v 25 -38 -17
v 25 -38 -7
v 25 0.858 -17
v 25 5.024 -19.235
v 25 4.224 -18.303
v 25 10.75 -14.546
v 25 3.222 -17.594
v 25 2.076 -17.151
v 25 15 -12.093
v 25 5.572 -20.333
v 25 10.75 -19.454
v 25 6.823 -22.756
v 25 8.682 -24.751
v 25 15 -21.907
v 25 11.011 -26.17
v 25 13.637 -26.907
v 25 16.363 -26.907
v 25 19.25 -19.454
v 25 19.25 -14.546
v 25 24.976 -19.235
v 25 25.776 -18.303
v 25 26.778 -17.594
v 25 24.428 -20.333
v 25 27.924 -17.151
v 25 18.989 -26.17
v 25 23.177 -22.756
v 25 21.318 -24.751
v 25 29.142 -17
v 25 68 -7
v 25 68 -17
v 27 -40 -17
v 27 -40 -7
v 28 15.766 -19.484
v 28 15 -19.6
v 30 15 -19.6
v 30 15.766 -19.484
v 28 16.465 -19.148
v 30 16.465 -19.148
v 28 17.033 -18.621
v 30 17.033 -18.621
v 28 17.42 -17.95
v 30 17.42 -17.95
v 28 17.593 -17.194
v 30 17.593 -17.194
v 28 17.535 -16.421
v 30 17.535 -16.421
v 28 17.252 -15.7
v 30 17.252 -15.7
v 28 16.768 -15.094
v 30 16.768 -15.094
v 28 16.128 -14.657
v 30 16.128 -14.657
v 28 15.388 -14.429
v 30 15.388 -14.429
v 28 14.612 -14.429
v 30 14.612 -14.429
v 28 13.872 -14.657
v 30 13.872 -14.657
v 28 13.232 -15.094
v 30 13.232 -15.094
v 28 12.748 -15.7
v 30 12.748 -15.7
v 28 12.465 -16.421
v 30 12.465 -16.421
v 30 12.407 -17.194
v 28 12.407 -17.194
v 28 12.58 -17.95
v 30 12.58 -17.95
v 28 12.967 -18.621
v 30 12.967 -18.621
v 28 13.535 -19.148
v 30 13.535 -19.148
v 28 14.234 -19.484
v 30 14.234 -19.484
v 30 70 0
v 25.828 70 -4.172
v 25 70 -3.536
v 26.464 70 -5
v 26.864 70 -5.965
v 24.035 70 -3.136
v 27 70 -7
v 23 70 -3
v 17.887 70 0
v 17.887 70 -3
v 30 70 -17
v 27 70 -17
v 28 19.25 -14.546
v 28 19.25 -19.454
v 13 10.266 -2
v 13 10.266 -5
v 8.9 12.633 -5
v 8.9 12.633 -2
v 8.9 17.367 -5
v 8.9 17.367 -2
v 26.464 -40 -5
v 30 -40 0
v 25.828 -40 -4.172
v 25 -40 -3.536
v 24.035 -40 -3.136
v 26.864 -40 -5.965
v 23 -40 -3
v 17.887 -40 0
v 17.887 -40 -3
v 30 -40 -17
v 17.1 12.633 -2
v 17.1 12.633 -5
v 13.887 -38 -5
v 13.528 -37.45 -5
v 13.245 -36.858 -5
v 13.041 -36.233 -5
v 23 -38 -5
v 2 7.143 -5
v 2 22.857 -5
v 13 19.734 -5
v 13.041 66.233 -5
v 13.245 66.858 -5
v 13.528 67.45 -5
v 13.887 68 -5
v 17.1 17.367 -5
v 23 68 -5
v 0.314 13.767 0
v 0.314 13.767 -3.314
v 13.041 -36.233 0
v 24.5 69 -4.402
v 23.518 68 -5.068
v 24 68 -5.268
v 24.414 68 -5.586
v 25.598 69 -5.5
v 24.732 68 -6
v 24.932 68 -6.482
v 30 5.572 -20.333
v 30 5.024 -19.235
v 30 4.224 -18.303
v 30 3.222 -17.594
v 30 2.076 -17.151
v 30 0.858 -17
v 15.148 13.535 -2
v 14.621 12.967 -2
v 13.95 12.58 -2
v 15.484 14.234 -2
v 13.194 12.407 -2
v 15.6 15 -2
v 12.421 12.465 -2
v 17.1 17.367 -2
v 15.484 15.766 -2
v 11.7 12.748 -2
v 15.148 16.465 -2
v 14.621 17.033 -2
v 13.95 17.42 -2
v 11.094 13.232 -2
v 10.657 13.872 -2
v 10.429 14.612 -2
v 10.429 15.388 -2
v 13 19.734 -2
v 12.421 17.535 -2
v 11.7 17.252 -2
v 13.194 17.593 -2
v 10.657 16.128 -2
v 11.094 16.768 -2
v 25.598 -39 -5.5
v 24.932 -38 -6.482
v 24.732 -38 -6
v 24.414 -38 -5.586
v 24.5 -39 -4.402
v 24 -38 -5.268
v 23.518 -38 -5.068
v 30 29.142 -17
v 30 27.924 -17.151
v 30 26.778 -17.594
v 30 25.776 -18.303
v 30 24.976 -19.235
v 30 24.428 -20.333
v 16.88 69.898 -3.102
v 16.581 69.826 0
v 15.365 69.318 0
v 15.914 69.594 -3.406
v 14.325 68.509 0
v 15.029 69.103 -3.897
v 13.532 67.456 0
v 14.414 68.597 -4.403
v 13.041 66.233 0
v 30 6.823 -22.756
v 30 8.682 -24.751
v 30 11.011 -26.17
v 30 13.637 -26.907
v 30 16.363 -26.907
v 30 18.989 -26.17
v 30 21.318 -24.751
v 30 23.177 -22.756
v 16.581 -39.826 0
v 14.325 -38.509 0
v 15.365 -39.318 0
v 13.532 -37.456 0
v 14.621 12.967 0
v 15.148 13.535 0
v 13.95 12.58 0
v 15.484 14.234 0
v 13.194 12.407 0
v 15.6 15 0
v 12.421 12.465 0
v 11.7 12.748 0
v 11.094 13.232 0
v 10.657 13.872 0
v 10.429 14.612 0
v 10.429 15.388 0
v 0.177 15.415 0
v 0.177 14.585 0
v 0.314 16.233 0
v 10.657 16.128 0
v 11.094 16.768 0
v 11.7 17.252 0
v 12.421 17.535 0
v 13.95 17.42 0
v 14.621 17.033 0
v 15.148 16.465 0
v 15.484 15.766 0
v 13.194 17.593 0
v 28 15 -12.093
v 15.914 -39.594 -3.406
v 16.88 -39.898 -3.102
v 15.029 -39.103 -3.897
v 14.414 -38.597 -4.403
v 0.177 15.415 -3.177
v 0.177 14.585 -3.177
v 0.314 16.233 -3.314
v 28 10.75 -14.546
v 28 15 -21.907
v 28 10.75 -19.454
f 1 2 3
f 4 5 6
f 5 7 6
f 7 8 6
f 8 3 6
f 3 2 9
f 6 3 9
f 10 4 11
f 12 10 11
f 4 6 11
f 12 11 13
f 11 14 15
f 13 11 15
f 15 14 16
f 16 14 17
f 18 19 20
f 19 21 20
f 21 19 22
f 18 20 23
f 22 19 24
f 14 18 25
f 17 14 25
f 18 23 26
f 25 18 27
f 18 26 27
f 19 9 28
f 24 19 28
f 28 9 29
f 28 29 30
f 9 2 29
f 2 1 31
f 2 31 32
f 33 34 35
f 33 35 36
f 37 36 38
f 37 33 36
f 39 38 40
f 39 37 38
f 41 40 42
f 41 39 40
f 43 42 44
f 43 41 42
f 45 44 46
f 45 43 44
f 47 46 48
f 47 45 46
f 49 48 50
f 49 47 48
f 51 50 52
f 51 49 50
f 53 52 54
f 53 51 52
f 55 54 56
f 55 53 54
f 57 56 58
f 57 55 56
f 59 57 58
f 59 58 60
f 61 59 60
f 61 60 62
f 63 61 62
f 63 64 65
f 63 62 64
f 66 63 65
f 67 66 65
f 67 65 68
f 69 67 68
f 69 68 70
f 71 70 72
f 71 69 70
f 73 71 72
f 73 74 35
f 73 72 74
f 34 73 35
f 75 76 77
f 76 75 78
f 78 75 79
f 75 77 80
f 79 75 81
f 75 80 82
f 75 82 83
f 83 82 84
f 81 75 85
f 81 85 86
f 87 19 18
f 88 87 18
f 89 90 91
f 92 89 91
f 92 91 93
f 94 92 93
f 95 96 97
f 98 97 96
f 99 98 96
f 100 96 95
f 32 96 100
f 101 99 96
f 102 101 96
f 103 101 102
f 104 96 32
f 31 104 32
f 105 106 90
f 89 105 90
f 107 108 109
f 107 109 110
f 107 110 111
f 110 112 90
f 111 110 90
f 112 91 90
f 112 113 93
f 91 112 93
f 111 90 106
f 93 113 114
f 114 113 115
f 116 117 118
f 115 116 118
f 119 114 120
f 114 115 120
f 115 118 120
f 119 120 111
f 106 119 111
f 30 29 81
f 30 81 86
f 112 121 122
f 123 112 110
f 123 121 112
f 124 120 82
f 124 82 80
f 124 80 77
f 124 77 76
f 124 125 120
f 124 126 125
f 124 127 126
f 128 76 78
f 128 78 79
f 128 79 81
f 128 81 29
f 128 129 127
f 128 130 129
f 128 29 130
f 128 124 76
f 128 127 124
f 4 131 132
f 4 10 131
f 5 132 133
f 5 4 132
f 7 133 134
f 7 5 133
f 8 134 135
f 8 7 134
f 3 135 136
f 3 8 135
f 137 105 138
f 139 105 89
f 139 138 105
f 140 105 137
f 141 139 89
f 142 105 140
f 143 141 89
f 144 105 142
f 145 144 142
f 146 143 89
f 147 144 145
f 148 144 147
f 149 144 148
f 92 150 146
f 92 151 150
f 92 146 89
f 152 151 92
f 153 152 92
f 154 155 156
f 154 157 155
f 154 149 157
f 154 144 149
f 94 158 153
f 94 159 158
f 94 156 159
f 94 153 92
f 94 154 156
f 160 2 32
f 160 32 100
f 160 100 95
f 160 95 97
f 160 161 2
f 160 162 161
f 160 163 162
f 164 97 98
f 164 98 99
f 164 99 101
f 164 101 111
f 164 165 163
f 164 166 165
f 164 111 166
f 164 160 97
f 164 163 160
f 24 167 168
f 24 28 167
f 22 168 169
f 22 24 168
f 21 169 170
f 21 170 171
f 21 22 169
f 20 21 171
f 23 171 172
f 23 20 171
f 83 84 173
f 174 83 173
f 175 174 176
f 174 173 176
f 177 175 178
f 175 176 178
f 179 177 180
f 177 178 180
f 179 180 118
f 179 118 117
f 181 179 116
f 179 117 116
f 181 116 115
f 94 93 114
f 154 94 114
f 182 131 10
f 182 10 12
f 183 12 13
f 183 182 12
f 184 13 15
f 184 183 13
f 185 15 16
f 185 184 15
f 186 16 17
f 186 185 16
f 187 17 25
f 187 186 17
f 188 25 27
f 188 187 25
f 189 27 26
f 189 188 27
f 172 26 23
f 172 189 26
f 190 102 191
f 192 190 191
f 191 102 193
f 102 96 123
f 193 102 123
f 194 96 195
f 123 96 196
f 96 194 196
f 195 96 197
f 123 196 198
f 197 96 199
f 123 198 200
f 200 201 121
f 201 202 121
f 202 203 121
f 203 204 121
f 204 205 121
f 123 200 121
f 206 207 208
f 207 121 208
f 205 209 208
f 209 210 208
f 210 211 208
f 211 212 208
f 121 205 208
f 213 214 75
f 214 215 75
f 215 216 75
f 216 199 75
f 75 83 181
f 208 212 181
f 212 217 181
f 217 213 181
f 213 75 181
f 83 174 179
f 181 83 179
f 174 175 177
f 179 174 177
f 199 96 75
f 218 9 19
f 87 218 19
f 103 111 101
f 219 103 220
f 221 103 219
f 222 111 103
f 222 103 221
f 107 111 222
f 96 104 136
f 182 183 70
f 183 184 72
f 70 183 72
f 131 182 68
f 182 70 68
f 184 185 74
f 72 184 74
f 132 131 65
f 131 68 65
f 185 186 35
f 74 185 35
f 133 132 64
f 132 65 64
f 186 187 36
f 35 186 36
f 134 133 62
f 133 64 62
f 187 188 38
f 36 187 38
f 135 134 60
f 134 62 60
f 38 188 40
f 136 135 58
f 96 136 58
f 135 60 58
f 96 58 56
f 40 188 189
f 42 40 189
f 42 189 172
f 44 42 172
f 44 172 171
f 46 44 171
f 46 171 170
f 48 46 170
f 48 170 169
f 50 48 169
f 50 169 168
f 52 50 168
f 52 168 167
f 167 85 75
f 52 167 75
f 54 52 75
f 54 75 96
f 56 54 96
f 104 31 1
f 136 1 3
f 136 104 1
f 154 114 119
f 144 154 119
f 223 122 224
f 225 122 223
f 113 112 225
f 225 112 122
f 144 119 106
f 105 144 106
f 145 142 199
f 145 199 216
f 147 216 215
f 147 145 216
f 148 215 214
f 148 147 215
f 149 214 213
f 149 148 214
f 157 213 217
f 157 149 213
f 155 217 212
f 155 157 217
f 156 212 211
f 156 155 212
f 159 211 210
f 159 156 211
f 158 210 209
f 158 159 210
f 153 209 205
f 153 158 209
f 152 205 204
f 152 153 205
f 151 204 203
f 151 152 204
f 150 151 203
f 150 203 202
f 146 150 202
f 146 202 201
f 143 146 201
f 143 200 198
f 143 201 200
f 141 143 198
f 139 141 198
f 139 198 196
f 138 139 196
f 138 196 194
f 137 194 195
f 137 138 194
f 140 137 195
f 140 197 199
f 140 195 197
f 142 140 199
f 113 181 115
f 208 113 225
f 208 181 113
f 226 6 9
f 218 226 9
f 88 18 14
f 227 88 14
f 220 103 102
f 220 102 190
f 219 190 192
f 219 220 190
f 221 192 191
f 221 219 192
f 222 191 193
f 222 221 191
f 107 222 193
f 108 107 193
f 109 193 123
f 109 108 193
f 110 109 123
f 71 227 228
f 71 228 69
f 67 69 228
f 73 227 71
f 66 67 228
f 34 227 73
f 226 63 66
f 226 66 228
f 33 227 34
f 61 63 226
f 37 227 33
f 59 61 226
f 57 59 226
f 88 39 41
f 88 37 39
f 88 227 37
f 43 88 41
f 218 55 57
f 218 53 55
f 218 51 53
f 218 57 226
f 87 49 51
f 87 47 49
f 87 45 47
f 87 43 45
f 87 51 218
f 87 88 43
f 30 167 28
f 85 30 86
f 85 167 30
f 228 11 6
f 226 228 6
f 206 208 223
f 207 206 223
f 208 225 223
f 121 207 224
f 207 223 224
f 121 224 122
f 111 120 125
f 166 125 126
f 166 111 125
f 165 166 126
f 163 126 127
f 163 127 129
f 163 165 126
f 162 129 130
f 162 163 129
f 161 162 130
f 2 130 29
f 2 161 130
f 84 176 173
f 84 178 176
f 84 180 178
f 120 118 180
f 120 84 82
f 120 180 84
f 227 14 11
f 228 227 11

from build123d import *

# Parameters (mm, degrees)
BOSS_EXTRUDE1_DEPTH     = 30
CUT_EXTRUDE1_DEPTH      = 52.961524227
CUT_EXTRUDE1_DEPTH_BACK = 52.961524227
SKETCH2_R               = 2.6
CUT_EXTRUDE2_DEPTH      = 52.961524227
CUT_EXTRUDE2_DEPTH_BACK = 52.961524227
SKETCH3_R               = 2.6
CUT_EXTRUDE3_DEPTH      = 3
CUT_EXTRUDE4_DEPTH      = 3
BOSS_EXTRUDE4_DEPTH     = 40
BOSS_EXTRUDE5_START     = -30
BOSS_EXTRUDE5_DEPTH     = 40
FILLET2_R               = 5
FILLET3_R               = 2
CHAMFER2_SIZE           = 2
CUT_EXTRUDE7_DEPTH      = 81.156097709
CUT_EXTRUDE7_DEPTH_BACK = 81.156097709
FILLET4_R               = 5
CUT_EXTRUDE8_DEPTH      = 80.27168473
CUT_EXTRUDE8_DEPTH_BACK = 80.27168473
FILLET5_R               = 5


with BuildPart() as part:
    # Sketch1 → Boss-Extrude1 (new body)
    with BuildSketch(Plane(origin=(0, 0, 0), x_dir=(1, 0, 0), z_dir=(0, 1, 0))):
        Polygon((0, 0), (30, 0), (30, 30), (25, 30), (25, 5), (0, 5), align=None)
    extrude(amount=BOSS_EXTRUDE1_DEPTH)

    # Sketch2 → Cut-Extrude1 (cut, two sides: drawn at the far end of the back side and taken through both)
    with BuildSketch(Plane.XY.offset(-CUT_EXTRUDE1_DEPTH_BACK)):
        with Locations((13, 15)):
            Circle(SKETCH2_R)
    extrude(amount=CUT_EXTRUDE1_DEPTH + CUT_EXTRUDE1_DEPTH_BACK, mode=Mode.SUBTRACT)

    # Sketch3 → Cut-Extrude2 (cut, two sides: drawn at the far end of the back side and taken through both)
    with BuildSketch(Plane(origin=(30, 0, 0), x_dir=(0, 0, -1), z_dir=(1, 0, 0)).offset(-CUT_EXTRUDE2_DEPTH_BACK)):
        with Locations((17, 15)):
            Circle(SKETCH3_R)
    extrude(amount=CUT_EXTRUDE2_DEPTH + CUT_EXTRUDE2_DEPTH_BACK, mode=Mode.SUBTRACT)

    # Sketch4 → Cut-Extrude3 (cut)
    with BuildSketch(Plane.ZY.offset(-25)):
        Polygon((-21.907477288, 15), (-19.453738644, 10.75), (-14.546261356, 10.75), (-12.092522712, 15), (-14.546261356, 19.25), (-19.453738644, 19.25), align=None)
    extrude(amount=-CUT_EXTRUDE3_DEPTH, mode=Mode.SUBTRACT)

    # Sketch5 → Cut-Extrude4 (cut)
    with BuildSketch(Plane(origin=(0, 0, -5), x_dir=(-1, 0, 0), z_dir=(0, 0, -1))):
        Polygon((-17.1, 17.367136104), (-17.1, 12.632863896), (-13, 10.265727793), (-8.9, 12.632863896), (-8.9, 17.367136104), (-13, 19.734272207), align=None)
    extrude(amount=-CUT_EXTRUDE4_DEPTH, mode=Mode.SUBTRACT)

    # Sketch8 → Boss-Extrude4 (add)
    with BuildSketch(Plane(origin=(0, 30, 0), x_dir=(1, 0, 0), z_dir=(0, 1, 0))):
        Polygon((0, 5), (25, 5), (25, 30), (30, 30), (30, 0), (0, 0), align=None)
    extrude(amount=BOSS_EXTRUDE4_DEPTH)

    # Sketch8<2> → Boss-Extrude5 (add)
    with BuildSketch(Plane(origin=(0, 30, 0), x_dir=(1, 0, 0), z_dir=(0, 1, 0)).offset(BOSS_EXTRUDE5_START)):
        Polygon((0, 5), (25, 5), (25, 30), (30, 30), (30, 0), (0, 0), align=None)
    extrude(amount=-BOSS_EXTRUDE5_DEPTH)

    # Fillet2
    fillet2_edges = [part.edges().sort_by_distance(p)[0] for p in [
        (0, 70, -2.5),
        (27.5, 70, -30),
        (27.5, -40, -30),
        (0, -40, -2.5),
    ]]
    fillet(fillet2_edges, radius=FILLET2_R)

    # Fillet3
    fillet3_edges = [part.edges().sort_by_distance(p)[0] for p in [
        (25, 15, -5),
    ]]
    fillet(fillet3_edges, radius=FILLET3_R)

    # Chamfer2
    chamfer2_edges = [part.edges().sort_by_distance(p)[0] for p in [
        (25, 70, -16),
        (25, 15, -30),
        (25, -40, -16),
        (25, -38.535533906, -28.535533906),
        (25, 68.535533906, -28.535533906),
        (0, 15, -5),
        (1.464466094, -38.535533906, -5),
        (1.464466094, 68.535533906, -5),
        (14, 70, -5),
        (14, -40, -5),
        (24.414213562, -40, -5.585786438),
        (24.414213562, 70, -5.585786438),
    ]]
    chamfer(chamfer2_edges, length=CHAMFER2_SIZE)

    # Sketch11 → Cut-Extrude7 (cut, two sides: drawn at the far end of the back side and taken through both)
    with BuildSketch(Plane.ZY.offset(-25).offset(-CUT_EXTRUDE7_DEPTH_BACK)):
        with BuildLine():
            Line((-17, 25), (-17, 79.176495752))
            Line((-17, 79.176495752), (-82.490941739, 30.916627992))
            Line((-82.490941739, 30.916627992), (-67.497355256, -40.744999046))
            Line((-67.497355256, -40.744999046), (-17, -61.114612426))
            Line((-17, -61.114612426), (-17, 5))
            ThreePointArc((-17, 5), (-27, 15), (-17, 25))
        make_face()
    extrude(amount=CUT_EXTRUDE7_DEPTH + CUT_EXTRUDE7_DEPTH_BACK, mode=Mode.SUBTRACT)

    # Fillet4
    fillet4_edges = [part.edges().sort_by_distance(p)[0] for p in [
        (27.5, 25, -17),
        (27.5, 5, -17),
    ]]
    fillet(fillet4_edges, radius=FILLET4_R)

    # Sketch12 → Cut-Extrude8 (cut, two sides: drawn at the far end of the back side and taken through both)
    with BuildSketch(Plane(origin=(0, 0, -5), x_dir=(-1, 0, 0), z_dir=(0, 0, -1)).offset(-CUT_EXTRUDE8_DEPTH_BACK)):
        Polygon((-14, 70), (0, 15), (-14, -40), (29.605001417, -51.099454906), (59.954696555, 7.95039026), (29.605001417, 77.986583132), (-23, 76.936040239), align=None)
    extrude(amount=CUT_EXTRUDE8_DEPTH + CUT_EXTRUDE8_DEPTH_BACK, mode=Mode.SUBTRACT)

    # Fillet5
    fillet5_edges = [part.edges().sort_by_distance(p)[0] for p in [
        (14, -40, -1.5),
        (14, 70, -1.5),
        (0, 15, -1.5),
    ]]
    fillet(fillet5_edges, radius=FILLET5_R)


solid = part.part
